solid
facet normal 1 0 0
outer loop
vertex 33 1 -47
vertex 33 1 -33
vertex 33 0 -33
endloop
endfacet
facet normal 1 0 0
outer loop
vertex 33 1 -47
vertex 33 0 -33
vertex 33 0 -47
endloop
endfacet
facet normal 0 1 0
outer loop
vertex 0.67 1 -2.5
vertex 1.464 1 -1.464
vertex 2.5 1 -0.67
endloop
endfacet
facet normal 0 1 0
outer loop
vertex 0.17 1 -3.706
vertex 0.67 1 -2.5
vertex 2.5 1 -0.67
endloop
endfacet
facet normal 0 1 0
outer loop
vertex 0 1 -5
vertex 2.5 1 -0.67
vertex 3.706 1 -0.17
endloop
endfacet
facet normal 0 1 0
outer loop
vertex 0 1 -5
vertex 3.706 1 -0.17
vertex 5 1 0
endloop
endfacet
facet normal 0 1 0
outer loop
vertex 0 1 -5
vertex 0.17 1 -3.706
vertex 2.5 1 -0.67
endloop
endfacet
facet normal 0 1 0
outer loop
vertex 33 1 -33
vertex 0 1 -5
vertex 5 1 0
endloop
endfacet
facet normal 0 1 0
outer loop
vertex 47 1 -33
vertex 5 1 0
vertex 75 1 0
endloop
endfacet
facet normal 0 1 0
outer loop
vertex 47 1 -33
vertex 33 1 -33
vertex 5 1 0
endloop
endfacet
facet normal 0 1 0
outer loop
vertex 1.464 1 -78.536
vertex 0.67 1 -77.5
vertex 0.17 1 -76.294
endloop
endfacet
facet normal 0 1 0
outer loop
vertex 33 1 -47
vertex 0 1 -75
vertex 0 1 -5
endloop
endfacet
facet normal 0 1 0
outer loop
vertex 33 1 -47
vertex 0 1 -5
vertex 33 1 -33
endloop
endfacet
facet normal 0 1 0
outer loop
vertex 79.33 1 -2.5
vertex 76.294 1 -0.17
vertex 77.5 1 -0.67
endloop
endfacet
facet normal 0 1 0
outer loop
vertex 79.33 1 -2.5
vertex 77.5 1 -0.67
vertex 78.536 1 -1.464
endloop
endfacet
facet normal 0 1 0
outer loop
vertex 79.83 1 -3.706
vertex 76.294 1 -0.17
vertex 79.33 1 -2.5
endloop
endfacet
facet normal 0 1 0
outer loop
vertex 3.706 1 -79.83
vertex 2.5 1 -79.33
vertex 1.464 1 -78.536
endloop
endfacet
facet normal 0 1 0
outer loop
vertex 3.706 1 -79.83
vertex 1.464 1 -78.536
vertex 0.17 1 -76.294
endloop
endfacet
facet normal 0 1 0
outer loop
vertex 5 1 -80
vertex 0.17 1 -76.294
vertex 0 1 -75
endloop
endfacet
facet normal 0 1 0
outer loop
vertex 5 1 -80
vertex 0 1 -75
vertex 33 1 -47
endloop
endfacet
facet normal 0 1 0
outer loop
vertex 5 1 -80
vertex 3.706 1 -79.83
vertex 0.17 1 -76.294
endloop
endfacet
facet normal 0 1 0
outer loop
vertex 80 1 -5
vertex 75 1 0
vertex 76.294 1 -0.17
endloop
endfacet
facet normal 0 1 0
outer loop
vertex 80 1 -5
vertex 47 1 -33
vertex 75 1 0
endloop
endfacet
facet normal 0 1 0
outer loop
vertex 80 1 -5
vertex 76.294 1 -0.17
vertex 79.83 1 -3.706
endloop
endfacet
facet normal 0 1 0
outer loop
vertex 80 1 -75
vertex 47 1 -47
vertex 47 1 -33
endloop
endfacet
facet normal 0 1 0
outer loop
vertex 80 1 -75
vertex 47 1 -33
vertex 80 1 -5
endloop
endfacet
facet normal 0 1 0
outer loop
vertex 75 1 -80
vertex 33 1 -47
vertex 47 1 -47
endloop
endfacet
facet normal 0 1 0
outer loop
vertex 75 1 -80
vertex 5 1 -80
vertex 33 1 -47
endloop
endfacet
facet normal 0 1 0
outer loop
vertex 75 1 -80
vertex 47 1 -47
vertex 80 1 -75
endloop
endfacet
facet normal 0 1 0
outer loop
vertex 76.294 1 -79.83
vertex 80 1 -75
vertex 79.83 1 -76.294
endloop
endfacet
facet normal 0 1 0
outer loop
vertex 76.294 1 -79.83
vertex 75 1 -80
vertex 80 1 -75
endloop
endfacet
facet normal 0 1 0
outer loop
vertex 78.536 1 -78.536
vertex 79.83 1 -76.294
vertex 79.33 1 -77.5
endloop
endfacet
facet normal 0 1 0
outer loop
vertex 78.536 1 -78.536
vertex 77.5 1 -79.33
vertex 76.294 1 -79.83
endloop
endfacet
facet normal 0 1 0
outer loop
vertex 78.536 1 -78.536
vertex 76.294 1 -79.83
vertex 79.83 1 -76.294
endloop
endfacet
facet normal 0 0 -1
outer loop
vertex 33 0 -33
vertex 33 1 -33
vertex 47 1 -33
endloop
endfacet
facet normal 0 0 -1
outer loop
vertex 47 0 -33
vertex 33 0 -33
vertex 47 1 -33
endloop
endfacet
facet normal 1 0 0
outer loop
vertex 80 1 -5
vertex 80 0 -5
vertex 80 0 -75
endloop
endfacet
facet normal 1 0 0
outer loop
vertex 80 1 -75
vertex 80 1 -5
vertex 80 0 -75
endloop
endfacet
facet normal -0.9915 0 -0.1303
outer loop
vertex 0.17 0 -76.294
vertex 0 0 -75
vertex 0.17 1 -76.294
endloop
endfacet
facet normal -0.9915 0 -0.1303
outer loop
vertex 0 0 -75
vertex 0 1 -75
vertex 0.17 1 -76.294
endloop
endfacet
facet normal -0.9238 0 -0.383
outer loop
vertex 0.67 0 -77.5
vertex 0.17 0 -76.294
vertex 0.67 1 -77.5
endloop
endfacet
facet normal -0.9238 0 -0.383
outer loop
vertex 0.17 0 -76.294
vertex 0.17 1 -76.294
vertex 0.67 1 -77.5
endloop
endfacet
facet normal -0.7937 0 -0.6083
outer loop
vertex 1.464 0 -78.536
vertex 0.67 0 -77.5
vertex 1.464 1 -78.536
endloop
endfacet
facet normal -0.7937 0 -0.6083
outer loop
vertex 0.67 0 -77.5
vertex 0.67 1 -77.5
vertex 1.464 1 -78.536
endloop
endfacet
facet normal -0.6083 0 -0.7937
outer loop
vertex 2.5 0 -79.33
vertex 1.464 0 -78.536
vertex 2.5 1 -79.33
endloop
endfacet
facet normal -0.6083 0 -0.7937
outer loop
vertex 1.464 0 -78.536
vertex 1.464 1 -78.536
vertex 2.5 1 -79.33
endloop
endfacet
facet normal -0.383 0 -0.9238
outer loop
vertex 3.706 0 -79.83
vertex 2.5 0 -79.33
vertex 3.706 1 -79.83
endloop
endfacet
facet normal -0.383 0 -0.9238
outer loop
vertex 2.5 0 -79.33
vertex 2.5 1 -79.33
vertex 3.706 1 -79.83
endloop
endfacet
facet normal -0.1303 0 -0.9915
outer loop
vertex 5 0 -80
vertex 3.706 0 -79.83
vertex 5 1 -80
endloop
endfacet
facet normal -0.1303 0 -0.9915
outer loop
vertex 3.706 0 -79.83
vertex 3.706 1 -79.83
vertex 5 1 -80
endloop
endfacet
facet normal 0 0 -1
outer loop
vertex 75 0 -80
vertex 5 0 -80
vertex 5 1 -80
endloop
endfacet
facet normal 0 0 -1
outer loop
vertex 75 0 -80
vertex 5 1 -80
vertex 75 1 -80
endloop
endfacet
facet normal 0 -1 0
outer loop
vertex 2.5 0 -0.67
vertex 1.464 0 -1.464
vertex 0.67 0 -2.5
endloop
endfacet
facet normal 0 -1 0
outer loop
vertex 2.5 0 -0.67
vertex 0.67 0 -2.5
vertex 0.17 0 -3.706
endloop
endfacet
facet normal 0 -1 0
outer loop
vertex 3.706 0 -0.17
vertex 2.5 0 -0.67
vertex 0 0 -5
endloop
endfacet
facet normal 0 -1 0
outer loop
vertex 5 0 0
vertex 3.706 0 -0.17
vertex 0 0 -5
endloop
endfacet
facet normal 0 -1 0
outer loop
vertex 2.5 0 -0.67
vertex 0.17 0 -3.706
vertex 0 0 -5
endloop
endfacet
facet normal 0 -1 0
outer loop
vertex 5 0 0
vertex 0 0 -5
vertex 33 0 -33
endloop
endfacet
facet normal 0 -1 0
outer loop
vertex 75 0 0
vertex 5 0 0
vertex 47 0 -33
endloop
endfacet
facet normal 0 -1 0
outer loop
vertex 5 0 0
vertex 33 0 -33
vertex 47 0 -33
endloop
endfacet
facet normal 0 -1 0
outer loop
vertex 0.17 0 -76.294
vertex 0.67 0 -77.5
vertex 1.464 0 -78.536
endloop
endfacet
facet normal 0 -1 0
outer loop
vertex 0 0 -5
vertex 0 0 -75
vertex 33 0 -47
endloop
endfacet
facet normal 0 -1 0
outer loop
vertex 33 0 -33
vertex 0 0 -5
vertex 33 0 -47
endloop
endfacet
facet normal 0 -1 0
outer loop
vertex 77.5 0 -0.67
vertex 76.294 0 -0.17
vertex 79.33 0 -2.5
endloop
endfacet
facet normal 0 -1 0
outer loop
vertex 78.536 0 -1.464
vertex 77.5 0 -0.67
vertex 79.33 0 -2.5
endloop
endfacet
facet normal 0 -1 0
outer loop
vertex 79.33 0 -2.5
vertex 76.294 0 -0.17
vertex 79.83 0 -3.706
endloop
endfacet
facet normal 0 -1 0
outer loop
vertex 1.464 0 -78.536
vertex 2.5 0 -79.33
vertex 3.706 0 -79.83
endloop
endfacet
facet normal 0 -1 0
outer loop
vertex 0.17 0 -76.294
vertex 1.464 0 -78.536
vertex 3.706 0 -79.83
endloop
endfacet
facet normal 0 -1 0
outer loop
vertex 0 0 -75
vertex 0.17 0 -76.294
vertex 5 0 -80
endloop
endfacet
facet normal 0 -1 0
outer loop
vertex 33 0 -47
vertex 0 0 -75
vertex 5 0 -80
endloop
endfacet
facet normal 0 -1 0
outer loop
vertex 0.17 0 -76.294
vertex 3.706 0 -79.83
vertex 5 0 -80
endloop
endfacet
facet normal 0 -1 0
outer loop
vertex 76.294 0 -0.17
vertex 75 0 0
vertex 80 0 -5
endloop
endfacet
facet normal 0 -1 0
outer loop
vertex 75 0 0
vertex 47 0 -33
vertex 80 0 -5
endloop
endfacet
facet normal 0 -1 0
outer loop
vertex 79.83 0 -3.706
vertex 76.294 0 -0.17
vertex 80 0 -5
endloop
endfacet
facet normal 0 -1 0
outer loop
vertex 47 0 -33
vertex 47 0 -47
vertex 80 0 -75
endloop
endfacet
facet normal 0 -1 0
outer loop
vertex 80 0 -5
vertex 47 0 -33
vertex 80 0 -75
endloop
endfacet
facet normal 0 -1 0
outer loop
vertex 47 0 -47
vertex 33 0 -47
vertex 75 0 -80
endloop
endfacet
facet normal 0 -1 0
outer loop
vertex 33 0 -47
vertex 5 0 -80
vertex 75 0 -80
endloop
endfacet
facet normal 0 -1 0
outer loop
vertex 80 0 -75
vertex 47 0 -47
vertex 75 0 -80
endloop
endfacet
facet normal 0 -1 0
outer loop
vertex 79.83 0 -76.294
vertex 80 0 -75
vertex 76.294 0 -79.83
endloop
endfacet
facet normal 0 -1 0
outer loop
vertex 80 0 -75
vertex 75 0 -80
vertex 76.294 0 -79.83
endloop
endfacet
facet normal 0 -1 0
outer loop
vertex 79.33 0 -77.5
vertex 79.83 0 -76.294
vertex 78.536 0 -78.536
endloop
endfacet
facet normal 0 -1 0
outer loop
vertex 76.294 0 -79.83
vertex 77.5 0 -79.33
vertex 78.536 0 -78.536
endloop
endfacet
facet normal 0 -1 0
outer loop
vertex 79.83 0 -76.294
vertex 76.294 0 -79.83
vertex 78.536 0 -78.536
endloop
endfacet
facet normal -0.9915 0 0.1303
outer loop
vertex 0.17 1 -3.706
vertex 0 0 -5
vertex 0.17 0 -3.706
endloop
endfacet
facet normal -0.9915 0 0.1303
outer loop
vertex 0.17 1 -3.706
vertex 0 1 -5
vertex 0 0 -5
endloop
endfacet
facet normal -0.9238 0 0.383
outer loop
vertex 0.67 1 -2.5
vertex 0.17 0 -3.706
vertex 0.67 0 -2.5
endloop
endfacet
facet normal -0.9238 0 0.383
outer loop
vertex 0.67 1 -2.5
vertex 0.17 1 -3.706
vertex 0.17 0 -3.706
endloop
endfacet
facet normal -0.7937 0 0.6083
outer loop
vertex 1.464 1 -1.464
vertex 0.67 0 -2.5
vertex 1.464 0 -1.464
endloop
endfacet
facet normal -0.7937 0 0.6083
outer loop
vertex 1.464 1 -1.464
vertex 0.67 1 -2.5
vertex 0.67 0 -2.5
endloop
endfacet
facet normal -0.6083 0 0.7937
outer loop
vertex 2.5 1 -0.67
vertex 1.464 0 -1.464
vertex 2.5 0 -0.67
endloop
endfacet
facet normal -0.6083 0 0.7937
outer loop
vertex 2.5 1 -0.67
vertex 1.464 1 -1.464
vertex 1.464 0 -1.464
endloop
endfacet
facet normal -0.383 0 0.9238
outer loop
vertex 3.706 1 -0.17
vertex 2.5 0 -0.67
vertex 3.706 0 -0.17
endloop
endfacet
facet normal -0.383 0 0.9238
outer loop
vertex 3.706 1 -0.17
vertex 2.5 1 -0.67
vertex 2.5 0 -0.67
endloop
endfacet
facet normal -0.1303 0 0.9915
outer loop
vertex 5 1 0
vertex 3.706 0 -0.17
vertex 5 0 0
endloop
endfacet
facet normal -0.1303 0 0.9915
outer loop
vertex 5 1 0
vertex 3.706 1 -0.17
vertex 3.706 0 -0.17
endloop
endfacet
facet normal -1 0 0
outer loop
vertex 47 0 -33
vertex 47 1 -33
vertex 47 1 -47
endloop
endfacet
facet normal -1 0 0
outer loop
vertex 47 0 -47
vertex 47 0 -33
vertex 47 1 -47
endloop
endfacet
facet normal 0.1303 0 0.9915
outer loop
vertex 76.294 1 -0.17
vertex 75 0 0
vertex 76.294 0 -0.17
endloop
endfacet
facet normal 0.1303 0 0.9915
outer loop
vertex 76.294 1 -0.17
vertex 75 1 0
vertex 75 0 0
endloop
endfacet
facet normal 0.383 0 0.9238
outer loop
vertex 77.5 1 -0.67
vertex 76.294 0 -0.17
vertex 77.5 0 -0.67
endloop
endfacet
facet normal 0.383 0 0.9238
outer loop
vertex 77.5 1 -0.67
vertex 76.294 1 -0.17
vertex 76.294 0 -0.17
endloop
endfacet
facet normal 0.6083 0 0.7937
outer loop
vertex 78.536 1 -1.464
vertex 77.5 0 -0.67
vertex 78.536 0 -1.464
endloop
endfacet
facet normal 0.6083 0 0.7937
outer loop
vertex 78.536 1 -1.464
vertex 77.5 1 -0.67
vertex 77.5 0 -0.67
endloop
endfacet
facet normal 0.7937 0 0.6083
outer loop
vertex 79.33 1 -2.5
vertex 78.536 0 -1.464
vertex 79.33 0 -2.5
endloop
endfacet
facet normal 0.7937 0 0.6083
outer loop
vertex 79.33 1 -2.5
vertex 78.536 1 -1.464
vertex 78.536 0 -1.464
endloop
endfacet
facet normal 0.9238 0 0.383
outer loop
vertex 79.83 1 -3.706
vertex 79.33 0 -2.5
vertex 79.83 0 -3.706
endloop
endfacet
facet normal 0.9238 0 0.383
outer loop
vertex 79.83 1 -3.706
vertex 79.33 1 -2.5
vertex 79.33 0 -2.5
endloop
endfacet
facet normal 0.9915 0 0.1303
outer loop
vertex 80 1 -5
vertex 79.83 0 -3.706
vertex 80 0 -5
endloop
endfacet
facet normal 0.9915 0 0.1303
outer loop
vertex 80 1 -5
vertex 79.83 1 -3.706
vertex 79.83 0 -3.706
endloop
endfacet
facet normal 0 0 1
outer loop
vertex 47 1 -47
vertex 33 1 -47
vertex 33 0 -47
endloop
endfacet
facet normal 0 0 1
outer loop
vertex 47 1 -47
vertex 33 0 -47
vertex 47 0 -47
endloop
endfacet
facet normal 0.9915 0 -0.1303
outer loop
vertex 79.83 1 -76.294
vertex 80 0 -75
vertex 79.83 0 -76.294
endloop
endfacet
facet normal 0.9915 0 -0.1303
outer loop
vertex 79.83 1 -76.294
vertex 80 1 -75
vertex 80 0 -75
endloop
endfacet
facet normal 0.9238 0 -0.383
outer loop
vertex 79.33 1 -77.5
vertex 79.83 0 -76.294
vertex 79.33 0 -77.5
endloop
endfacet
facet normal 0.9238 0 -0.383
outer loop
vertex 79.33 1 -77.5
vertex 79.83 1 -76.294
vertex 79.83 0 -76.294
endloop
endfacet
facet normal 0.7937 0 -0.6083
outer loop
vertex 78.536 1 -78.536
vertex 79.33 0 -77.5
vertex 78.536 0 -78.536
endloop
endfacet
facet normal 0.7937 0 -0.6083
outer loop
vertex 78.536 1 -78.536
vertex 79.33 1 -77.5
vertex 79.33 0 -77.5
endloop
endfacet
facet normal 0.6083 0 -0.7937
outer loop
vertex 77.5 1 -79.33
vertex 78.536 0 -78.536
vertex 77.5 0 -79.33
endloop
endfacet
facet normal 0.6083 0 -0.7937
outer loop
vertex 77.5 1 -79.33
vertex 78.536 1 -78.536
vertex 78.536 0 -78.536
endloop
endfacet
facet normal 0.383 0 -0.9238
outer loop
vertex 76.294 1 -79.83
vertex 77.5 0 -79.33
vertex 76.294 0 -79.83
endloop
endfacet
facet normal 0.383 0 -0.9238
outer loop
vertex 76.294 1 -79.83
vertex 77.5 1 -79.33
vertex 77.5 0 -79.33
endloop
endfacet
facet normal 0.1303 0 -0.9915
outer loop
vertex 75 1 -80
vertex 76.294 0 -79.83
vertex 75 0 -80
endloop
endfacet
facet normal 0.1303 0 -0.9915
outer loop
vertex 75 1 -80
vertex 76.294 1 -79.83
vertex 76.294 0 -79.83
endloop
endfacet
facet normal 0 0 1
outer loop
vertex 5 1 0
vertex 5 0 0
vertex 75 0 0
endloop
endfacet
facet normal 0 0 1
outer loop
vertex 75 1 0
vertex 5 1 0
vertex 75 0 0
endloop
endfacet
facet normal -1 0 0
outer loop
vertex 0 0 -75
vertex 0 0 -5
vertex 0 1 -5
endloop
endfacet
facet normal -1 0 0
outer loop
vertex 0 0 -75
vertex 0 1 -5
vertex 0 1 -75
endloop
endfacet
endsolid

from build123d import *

# Parameters (mm, degrees)
ESQUISSE1_W             = 80
ESQUISSE1_H             = 80
EXTRUSION1_DEPTH        = 1
CONG_1_R                = 5
ESQUISSE2_W             = 14
ESQUISSE2_H             = 14
ENL_V_MAT_EXTRU_1_DEPTH = 2


with BuildPart() as part:
    # Esquisse1 → Extrusion1 (new body)
    with BuildSketch(Plane(origin=(0, 0, 0), x_dir=(1, 0, 0), z_dir=(0, 1, 0))):
        with Locations((40, 40)):
            Rectangle(ESQUISSE1_W, ESQUISSE1_H)
    extrude(amount=EXTRUSION1_DEPTH)

    # Congé1
    cong_1_edges = [part.edges().sort_by_distance(p)[0] for p in [
        (0, 0.5, -80),
        (80, 0.5, -80),
        (80, 0.5, 0),
        (0, 0.5, 0),
    ]]
    fillet(cong_1_edges, radius=CONG_1_R)

    # Esquisse2 → Enlèv. mat.-Extru.1 (cut, through all)
    with BuildSketch(Plane(origin=(0, 1, 0), x_dir=(1, 0, 0), z_dir=(0, 1, 0))):
        with Locations((40, 40)):
            Rectangle(ESQUISSE2_W, ESQUISSE2_H)
    extrude(amount=-ENL_V_MAT_EXTRU_1_DEPTH, mode=Mode.SUBTRACT)


solid = part.part
